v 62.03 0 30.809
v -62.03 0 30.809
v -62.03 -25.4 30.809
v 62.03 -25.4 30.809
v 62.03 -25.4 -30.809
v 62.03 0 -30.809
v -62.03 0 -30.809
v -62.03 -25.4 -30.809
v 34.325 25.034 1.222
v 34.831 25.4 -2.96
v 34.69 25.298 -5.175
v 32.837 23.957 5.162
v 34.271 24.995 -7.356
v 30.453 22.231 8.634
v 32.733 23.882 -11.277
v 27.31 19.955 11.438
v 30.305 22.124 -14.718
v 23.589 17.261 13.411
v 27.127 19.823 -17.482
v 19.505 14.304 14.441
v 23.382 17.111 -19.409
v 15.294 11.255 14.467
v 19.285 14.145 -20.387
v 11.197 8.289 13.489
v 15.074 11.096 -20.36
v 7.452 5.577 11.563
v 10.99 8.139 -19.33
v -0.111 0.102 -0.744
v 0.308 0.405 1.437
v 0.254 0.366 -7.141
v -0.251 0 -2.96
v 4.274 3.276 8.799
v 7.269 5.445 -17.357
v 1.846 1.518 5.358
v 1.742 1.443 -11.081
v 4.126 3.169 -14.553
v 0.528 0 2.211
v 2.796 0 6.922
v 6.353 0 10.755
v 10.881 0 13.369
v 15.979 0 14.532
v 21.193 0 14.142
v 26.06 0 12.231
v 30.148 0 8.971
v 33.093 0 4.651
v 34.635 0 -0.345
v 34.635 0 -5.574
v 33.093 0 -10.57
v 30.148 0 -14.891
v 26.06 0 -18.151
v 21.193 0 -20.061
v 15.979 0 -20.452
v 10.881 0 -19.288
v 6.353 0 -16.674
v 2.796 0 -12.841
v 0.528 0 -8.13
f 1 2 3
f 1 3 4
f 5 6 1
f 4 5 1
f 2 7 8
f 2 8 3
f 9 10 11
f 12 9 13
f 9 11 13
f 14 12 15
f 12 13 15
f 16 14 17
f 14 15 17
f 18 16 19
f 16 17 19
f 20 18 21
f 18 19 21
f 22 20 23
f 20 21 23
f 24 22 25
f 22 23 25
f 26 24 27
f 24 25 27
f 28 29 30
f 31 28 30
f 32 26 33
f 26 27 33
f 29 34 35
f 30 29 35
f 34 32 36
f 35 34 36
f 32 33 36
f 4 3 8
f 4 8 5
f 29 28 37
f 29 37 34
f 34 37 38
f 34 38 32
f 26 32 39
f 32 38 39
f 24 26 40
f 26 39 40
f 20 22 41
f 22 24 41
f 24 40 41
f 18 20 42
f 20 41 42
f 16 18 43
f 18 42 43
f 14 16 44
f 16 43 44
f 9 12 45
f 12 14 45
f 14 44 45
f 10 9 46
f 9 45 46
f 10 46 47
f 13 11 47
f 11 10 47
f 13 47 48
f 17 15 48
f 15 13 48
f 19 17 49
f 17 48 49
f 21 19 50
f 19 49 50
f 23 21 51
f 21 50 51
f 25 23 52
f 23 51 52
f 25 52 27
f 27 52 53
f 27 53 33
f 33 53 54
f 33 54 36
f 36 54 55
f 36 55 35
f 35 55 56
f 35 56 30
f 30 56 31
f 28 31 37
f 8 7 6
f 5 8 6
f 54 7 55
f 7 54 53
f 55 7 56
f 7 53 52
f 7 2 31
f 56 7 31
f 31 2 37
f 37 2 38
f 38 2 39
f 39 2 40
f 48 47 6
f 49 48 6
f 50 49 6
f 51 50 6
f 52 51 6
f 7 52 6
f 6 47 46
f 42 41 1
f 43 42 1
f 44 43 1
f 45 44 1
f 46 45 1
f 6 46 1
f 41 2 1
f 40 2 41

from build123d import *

# Parameters (mm, degrees)
F0_W     = 124.060318
F0_H     = 61.61835
F1_DEPTH = 25.4
F2_R     = 17.541001
F3_DEPTH = 25.4
F5_DEPTH = 61.61935


with BuildPart() as f1:
    # F0 (on Front) → F1 (new body)
    with BuildSketch(Plane.XZ):
        Rectangle(F0_W, F0_H)
    extrude(amount=F1_DEPTH)

    # F2 (on face) → F3 (join)
    with BuildSketch(Plane(origin=(0, 0, 0), x_dir=(-1, 0, 0), z_dir=(0, 1, 0))):
        with Locations((-17.289521, -2.959591)):
            Circle(F2_R)
    extrude(amount=F3_DEPTH)

    # F4 (on face) → F5 (cut, through all)
    with BuildSketch(Plane(origin=(0, 0, -30.809175), x_dir=(1, 0, 0), z_dir=(0, 0, -1))):
        Polygon((-0.25148, -25.4), (34.830522, -25.4), (-0.25148, 0), align=None)
    extrude(amount=-F5_DEPTH, mode=Mode.SUBTRACT)


solid = f1.part
